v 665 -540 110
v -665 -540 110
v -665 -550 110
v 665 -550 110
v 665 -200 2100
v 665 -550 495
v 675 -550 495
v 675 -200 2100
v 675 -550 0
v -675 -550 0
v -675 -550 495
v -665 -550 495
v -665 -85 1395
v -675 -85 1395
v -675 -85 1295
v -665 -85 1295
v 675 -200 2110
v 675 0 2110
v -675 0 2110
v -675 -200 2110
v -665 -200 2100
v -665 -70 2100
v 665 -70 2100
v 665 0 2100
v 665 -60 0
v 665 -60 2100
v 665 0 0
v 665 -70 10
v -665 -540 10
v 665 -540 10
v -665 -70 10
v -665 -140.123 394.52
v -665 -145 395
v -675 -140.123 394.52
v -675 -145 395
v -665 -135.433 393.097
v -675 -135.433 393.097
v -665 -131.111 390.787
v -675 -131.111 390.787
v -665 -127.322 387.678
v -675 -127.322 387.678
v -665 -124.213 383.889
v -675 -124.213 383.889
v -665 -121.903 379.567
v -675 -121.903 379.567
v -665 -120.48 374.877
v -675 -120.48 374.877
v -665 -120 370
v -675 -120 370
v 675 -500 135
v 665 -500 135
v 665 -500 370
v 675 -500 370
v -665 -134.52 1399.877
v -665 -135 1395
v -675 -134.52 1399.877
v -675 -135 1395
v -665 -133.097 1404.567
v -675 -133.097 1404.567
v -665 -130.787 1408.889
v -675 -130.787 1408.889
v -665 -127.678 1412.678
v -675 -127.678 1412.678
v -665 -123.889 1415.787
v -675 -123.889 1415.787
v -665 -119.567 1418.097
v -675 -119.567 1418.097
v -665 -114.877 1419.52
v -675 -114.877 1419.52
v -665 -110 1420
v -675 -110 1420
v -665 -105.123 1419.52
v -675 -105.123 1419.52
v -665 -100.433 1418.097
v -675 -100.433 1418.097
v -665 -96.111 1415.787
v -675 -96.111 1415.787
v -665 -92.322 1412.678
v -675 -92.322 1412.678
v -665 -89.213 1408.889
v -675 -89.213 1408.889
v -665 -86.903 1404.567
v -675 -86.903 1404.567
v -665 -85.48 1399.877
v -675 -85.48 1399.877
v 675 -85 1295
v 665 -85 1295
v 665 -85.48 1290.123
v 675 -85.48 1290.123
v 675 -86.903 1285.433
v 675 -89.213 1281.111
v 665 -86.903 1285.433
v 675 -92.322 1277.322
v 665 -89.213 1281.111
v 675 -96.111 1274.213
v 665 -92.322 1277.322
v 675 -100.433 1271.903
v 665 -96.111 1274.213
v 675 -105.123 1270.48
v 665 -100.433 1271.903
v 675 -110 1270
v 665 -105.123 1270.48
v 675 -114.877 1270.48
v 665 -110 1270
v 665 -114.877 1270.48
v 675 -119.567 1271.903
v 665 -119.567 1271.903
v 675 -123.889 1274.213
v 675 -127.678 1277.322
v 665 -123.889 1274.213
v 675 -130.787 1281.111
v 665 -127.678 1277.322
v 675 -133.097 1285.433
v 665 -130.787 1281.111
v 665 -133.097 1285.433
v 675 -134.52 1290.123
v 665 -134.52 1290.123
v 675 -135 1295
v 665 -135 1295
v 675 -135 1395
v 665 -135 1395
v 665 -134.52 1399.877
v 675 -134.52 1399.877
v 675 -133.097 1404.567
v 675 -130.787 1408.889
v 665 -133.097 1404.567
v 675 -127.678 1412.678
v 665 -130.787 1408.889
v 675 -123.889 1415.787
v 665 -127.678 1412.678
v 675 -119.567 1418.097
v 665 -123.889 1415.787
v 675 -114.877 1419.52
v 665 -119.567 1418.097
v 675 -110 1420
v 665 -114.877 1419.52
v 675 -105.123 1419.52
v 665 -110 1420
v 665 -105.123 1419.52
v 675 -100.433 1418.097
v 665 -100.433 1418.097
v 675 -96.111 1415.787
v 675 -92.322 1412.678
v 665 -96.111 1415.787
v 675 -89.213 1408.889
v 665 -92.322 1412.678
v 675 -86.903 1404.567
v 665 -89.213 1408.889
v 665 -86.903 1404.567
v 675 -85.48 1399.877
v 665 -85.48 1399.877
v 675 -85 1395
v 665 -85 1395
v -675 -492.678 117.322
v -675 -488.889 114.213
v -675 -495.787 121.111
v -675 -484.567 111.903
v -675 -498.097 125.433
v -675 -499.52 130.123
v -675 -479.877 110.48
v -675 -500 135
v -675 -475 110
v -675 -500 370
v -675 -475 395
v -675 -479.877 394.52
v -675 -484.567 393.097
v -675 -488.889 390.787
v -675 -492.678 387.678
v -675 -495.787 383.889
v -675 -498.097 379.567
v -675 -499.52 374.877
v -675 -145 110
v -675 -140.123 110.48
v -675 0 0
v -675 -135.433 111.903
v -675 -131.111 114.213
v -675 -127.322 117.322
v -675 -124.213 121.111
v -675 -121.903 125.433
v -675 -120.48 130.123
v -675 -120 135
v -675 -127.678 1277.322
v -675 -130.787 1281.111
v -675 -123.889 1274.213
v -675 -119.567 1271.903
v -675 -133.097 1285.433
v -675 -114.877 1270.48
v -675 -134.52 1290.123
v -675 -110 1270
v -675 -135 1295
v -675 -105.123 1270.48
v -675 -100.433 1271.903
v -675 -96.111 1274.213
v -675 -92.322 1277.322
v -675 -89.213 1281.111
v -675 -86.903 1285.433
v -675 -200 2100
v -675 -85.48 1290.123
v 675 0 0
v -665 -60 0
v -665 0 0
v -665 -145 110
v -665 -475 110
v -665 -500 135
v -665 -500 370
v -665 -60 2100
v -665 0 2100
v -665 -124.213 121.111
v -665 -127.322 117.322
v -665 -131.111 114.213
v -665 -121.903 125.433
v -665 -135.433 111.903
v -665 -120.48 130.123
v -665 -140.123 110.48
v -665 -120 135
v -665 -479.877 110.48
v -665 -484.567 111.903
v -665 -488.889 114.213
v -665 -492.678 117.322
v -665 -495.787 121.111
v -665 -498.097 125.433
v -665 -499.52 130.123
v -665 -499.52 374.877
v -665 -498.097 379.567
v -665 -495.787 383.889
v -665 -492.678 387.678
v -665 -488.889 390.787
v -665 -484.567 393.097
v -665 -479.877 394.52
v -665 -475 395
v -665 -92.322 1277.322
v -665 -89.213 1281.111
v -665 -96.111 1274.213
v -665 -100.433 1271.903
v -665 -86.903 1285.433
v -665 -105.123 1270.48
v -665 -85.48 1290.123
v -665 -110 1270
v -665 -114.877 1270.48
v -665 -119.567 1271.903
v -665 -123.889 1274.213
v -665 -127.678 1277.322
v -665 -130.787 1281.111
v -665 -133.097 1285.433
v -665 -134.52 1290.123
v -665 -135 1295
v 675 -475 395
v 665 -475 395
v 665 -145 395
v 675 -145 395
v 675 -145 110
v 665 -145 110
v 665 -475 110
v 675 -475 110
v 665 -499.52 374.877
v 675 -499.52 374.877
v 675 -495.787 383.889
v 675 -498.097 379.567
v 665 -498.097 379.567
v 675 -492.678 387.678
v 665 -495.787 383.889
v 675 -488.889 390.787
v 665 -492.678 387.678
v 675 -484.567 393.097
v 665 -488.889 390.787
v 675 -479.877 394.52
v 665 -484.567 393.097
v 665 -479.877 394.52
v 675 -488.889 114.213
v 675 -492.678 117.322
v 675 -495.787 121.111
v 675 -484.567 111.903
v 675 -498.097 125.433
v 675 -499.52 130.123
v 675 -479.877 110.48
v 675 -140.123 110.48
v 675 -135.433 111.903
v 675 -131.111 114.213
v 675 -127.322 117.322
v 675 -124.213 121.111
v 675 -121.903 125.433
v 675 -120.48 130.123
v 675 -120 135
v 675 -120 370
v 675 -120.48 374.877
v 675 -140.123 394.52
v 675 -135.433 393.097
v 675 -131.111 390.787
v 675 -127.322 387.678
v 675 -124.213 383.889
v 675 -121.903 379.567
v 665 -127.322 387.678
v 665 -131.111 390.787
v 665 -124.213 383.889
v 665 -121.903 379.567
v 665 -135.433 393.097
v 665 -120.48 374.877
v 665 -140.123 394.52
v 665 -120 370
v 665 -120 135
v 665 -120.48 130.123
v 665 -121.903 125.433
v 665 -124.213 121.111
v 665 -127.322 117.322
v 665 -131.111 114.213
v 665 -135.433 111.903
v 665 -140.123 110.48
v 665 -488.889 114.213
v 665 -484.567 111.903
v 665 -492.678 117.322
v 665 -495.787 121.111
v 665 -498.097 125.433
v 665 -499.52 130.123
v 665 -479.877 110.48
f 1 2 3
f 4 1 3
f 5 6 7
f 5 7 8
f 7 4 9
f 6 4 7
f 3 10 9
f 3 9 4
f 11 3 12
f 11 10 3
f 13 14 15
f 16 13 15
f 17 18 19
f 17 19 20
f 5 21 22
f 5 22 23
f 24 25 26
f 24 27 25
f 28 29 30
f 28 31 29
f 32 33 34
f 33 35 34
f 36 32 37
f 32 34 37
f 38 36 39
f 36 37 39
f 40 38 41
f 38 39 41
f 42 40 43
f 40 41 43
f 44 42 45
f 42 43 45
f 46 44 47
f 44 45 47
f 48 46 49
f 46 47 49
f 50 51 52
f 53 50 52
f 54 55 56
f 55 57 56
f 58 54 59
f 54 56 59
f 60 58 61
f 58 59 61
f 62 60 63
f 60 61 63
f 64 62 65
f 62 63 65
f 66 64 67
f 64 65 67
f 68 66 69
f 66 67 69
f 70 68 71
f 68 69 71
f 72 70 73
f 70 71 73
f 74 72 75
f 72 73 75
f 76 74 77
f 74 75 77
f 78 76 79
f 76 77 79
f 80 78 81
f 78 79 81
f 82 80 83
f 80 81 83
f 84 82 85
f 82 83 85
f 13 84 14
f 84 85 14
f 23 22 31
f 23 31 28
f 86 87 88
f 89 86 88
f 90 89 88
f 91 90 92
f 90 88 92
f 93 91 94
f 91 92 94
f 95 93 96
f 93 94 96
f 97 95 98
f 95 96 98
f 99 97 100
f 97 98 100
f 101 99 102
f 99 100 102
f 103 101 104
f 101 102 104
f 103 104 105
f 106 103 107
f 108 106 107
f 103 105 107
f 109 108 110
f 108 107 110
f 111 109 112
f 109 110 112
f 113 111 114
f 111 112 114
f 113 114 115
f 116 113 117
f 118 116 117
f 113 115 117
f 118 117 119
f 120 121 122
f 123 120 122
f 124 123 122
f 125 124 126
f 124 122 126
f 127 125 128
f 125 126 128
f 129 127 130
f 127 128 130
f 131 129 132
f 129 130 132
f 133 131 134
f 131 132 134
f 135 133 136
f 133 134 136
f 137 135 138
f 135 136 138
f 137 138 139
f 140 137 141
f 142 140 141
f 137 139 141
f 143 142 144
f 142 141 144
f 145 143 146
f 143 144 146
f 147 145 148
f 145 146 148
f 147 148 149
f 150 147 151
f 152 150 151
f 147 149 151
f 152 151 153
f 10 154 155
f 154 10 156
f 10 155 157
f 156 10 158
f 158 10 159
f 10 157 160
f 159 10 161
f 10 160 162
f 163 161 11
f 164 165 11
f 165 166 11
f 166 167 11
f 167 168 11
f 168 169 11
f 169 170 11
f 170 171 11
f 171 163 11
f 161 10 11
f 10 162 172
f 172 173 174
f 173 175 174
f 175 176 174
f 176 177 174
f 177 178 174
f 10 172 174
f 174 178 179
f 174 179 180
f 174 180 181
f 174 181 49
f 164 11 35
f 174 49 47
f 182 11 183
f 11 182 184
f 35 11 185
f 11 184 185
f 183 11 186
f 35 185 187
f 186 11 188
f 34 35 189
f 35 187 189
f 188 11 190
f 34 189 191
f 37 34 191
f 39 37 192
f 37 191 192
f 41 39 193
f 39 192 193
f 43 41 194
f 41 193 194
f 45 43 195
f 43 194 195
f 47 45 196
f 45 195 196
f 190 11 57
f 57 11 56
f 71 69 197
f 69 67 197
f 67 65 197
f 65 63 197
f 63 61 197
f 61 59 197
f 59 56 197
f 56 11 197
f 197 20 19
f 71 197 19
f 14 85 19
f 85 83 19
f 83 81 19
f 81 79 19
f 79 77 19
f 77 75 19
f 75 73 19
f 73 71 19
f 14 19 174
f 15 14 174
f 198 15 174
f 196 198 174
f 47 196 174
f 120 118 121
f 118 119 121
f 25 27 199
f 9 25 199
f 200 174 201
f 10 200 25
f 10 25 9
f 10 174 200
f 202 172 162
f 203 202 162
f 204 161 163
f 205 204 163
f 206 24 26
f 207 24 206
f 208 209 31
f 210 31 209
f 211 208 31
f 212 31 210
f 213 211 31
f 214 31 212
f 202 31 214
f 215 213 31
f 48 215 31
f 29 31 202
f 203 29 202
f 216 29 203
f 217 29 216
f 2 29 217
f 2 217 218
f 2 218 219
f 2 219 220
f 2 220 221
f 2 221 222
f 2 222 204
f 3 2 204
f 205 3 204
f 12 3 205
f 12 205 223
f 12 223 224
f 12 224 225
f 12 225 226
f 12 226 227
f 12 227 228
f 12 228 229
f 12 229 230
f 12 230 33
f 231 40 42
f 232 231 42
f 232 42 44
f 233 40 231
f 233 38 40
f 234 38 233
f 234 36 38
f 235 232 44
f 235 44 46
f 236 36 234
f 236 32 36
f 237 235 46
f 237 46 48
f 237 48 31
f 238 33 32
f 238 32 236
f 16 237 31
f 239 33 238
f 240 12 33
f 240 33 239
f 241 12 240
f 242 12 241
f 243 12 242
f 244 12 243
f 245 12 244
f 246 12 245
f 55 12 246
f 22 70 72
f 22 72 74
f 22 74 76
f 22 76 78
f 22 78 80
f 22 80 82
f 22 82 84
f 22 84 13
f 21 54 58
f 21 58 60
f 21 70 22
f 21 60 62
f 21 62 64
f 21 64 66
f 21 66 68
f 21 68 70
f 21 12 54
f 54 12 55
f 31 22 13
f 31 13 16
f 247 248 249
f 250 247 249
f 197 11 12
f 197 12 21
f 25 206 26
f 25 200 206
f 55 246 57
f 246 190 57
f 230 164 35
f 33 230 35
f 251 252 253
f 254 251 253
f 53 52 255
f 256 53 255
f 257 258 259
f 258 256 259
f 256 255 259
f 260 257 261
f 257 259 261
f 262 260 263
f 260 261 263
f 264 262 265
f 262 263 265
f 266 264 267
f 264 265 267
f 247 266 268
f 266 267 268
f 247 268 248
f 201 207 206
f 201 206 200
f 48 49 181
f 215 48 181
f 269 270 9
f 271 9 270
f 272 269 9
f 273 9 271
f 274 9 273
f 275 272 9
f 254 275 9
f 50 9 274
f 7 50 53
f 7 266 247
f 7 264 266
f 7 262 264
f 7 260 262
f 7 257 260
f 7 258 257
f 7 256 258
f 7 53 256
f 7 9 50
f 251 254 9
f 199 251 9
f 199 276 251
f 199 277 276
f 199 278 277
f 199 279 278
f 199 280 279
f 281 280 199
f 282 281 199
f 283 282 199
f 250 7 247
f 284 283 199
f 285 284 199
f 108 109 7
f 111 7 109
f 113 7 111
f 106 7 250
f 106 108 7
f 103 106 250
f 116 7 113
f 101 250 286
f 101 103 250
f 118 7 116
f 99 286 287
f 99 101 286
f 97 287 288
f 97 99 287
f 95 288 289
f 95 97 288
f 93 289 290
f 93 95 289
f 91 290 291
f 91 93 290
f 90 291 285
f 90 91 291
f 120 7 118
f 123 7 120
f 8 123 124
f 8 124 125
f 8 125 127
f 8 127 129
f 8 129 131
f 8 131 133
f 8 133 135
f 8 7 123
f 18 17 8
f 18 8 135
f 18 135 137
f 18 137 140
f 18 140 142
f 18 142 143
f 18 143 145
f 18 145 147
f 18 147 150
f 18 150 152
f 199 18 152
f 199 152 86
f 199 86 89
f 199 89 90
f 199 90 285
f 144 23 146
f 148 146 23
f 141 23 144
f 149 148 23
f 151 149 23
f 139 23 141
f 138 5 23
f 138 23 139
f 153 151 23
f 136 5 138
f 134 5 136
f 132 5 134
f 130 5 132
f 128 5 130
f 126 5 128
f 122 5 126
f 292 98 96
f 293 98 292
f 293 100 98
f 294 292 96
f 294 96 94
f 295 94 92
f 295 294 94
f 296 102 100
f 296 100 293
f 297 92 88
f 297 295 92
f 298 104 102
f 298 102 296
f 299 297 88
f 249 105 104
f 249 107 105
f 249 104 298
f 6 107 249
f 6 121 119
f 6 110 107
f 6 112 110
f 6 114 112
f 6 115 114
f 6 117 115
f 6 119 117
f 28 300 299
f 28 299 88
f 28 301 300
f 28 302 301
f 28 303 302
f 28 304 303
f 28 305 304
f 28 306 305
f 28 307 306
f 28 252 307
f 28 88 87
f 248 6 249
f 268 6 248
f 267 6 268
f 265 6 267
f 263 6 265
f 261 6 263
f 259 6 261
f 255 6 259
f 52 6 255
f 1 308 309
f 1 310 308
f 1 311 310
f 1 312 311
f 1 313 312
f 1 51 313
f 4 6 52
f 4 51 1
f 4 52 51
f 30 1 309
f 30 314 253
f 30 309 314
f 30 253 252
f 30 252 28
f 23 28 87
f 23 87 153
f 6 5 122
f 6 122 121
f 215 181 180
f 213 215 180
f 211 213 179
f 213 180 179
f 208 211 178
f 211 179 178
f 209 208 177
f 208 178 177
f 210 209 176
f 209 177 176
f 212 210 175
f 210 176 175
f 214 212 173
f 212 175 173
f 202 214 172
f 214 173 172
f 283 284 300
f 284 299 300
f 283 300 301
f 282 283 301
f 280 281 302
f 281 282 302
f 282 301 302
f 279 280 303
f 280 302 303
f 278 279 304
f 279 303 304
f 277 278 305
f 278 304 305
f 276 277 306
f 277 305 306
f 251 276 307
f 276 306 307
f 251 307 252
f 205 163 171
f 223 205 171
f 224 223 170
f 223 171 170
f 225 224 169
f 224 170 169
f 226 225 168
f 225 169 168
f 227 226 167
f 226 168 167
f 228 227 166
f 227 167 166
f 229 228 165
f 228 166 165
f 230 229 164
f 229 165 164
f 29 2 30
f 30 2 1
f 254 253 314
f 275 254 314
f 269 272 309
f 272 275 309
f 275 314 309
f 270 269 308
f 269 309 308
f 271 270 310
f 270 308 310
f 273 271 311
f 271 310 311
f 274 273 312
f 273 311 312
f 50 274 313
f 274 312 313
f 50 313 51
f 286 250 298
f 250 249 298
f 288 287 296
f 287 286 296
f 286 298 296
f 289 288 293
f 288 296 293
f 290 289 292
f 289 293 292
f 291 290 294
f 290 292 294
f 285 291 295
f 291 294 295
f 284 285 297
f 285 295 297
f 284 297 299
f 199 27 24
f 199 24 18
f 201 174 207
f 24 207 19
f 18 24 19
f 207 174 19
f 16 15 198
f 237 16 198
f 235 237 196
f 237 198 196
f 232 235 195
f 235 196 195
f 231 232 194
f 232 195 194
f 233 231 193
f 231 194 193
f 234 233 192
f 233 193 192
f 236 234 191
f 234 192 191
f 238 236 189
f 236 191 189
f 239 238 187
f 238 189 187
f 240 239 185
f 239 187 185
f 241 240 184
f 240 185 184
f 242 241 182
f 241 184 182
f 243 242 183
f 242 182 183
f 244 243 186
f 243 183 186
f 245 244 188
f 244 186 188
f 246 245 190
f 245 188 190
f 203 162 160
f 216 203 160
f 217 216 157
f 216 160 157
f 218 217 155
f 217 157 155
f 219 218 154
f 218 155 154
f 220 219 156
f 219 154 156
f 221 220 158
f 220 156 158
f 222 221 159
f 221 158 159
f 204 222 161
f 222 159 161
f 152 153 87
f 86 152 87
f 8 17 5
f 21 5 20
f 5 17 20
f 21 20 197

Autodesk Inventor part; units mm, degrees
ref_plane "YZ Plane" through (0, 0, 0) normal (1, 0, 0) x (0, 1, 0)
ref_plane "XZ Plane" through (0, 0, 0) normal (0, 1, 0) x (-1, 0, 0)
ref_plane "XY Plane" through (0, 0, 0) normal (0, 0, 1) x (1, 0, 0)
sketch "Sketch1" plane through (0, 0, 0) normal (1, 0, 0) x (0, 1, 0)
  line L0 (0, 0) -> (-550, 0)
  line L1 (0, 0) -> (0, 2110)
  line L2 (-550, 0) -> (-550, 495)
  line L3 (-550, 495) -> (-200, 2100)
  line L4 (0, 2110) -> (-200, 2110)
  line L5 (-200, 2110) -> (-200, 2100)
  line L6 (-475, 395) -> (-145, 395)
  line L7 (-120, 370) -> (-120, 135)
  line L8 (-145, 110) -> (-475, 110)
  line L9 (-500, 135) -> (-500, 370)
  arc A0 (-475, 395) -> (-500, 370) centre (-475, 370) ccw
  arc A1 (-500, 135) -> (-475, 110) centre (-475, 135) ccw
  arc A2 (-145, 110) -> (-120, 135) centre (-145, 135) ccw
  arc A3 (-120, 370) -> (-145, 395) centre (-145, 370) ccw
  line L10 (-110, 1420) -> (-110, 1420)
  line L11 (-85, 1395) -> (-85, 1295)
  line L12 (-110, 1270) -> (-110, 1270)
  line L13 (-135, 1295) -> (-135, 1395)
  arc A4 (-110, 1420) -> (-135, 1395) centre (-110, 1395) ccw
  arc A5 (-85, 1395) -> (-110, 1420) centre (-110, 1395) ccw
  arc A6 (-110, 1270) -> (-85, 1295) centre (-110, 1295) ccw
  arc A7 (-135, 1295) -> (-110, 1270) centre (-110, 1295) ccw
  point P0 (-120, 110)
  point P1 (-500, 110)
  point P2 (-85, 1270)
  point P3 (-85, 1420)
  point P4 (-135, 1270)
  dimension "d0" = 550
  dimension "d1" = 2110
  dimension "d2" = 495
  dimension "d3" = 200
  dimension "d4" = 10
  dimension "d5" = 380
  dimension "d6" = 285
  dimension "d10" = 110
  dimension "d11" = 120
  dimension "d12" = 25
  dimension "d13" = 50
  dimension "d14" = 150
  dimension "d15" = 1270
  dimension "d16" = 85
  dimension "d17" = 25
extrude "Extrusion1" add sketch "Sketch1" along normal mid plane 1350
sketch "Sketch2" plane through (-675, 0, 2110) normal (0, 1, 0) x (1, 0, 0)
  line L0 (1340, 10) -> (10, 10)
  line L1 (10, 10) -> (10, 2110)
  line L2 (10, 2110) -> (1340, 2110)
  line L3 (1340, 2110) -> (1340, 10)
  line L4 (0, 0) -> (1350, 0) projected
  line L5 (1350, 2110) -> (1350, 0) projected
  line L6 (0, 0) -> (0, 2110) projected
  line L7 (0, 2110) -> (1350, 2110) projected
  point P0 (675, 2110)
  dimension "d20" = 10
  dimension "d21" = 10
  dimension "d22" = 10
  dimension "d23" = 0
extrude "Extrusion2" cut sketch "Sketch2" against normal blind 60 contours L0 L1 L2 L3
sketch "Sketch3" plane through (-675, -550, 0) normal (0, -1, 0) x (1, 0, 0)
  line L0 (10, 2100) -> (1340, 2100)
  line L1 (1340, 2100) -> (1340, 110)
  line L2 (1340, 110) -> (10, 110)
  line L3 (10, 110) -> (10, 2100)
  line L4 (1350, 2100) -> (1350, 495) projected
  line L5 (0, 495) -> (0, 2100) projected
  line L6 (1350, 2110) -> (0, 2110) projected
  line L7 (0, 0) -> (1350, 0) projected
  point P0 (675, 0)
  dimension "d26" = 10
  dimension "d27" = 10
  dimension "d28" = 10
  dimension "d29" = 110
extrude "Extrusion3" cut sketch "Sketch3" against normal blind 480
sketch "Sketch4" plane through (675, -475, 110) normal (0, 0, 1) x (1, 0, 0)
  line L0 (-1340, -65) -> (-10, -65)
  line L1 (-10, -65) -> (-10, 405)
  line L2 (-10, 405) -> (-1340, 405)
  line L3 (-1340, 405) -> (-1340, -65)
  line L4 (-1350, -75) -> (-1350, 275) projected
  line L5 (-10, -75) -> (-1340, -75) projected
  line L6 (0, 275) -> (0, -75) projected
  line L7 (-1340, 415) -> (-10, 415) projected
  point P0 (-675, 475)
  dimension "d32" = 10
  dimension "d33" = 10
  dimension "d34" = 10
  dimension "d35" = 10
extrude "Extrusion4" cut sketch "Sketch4" against normal blind 100
properties part number "Стенд"
